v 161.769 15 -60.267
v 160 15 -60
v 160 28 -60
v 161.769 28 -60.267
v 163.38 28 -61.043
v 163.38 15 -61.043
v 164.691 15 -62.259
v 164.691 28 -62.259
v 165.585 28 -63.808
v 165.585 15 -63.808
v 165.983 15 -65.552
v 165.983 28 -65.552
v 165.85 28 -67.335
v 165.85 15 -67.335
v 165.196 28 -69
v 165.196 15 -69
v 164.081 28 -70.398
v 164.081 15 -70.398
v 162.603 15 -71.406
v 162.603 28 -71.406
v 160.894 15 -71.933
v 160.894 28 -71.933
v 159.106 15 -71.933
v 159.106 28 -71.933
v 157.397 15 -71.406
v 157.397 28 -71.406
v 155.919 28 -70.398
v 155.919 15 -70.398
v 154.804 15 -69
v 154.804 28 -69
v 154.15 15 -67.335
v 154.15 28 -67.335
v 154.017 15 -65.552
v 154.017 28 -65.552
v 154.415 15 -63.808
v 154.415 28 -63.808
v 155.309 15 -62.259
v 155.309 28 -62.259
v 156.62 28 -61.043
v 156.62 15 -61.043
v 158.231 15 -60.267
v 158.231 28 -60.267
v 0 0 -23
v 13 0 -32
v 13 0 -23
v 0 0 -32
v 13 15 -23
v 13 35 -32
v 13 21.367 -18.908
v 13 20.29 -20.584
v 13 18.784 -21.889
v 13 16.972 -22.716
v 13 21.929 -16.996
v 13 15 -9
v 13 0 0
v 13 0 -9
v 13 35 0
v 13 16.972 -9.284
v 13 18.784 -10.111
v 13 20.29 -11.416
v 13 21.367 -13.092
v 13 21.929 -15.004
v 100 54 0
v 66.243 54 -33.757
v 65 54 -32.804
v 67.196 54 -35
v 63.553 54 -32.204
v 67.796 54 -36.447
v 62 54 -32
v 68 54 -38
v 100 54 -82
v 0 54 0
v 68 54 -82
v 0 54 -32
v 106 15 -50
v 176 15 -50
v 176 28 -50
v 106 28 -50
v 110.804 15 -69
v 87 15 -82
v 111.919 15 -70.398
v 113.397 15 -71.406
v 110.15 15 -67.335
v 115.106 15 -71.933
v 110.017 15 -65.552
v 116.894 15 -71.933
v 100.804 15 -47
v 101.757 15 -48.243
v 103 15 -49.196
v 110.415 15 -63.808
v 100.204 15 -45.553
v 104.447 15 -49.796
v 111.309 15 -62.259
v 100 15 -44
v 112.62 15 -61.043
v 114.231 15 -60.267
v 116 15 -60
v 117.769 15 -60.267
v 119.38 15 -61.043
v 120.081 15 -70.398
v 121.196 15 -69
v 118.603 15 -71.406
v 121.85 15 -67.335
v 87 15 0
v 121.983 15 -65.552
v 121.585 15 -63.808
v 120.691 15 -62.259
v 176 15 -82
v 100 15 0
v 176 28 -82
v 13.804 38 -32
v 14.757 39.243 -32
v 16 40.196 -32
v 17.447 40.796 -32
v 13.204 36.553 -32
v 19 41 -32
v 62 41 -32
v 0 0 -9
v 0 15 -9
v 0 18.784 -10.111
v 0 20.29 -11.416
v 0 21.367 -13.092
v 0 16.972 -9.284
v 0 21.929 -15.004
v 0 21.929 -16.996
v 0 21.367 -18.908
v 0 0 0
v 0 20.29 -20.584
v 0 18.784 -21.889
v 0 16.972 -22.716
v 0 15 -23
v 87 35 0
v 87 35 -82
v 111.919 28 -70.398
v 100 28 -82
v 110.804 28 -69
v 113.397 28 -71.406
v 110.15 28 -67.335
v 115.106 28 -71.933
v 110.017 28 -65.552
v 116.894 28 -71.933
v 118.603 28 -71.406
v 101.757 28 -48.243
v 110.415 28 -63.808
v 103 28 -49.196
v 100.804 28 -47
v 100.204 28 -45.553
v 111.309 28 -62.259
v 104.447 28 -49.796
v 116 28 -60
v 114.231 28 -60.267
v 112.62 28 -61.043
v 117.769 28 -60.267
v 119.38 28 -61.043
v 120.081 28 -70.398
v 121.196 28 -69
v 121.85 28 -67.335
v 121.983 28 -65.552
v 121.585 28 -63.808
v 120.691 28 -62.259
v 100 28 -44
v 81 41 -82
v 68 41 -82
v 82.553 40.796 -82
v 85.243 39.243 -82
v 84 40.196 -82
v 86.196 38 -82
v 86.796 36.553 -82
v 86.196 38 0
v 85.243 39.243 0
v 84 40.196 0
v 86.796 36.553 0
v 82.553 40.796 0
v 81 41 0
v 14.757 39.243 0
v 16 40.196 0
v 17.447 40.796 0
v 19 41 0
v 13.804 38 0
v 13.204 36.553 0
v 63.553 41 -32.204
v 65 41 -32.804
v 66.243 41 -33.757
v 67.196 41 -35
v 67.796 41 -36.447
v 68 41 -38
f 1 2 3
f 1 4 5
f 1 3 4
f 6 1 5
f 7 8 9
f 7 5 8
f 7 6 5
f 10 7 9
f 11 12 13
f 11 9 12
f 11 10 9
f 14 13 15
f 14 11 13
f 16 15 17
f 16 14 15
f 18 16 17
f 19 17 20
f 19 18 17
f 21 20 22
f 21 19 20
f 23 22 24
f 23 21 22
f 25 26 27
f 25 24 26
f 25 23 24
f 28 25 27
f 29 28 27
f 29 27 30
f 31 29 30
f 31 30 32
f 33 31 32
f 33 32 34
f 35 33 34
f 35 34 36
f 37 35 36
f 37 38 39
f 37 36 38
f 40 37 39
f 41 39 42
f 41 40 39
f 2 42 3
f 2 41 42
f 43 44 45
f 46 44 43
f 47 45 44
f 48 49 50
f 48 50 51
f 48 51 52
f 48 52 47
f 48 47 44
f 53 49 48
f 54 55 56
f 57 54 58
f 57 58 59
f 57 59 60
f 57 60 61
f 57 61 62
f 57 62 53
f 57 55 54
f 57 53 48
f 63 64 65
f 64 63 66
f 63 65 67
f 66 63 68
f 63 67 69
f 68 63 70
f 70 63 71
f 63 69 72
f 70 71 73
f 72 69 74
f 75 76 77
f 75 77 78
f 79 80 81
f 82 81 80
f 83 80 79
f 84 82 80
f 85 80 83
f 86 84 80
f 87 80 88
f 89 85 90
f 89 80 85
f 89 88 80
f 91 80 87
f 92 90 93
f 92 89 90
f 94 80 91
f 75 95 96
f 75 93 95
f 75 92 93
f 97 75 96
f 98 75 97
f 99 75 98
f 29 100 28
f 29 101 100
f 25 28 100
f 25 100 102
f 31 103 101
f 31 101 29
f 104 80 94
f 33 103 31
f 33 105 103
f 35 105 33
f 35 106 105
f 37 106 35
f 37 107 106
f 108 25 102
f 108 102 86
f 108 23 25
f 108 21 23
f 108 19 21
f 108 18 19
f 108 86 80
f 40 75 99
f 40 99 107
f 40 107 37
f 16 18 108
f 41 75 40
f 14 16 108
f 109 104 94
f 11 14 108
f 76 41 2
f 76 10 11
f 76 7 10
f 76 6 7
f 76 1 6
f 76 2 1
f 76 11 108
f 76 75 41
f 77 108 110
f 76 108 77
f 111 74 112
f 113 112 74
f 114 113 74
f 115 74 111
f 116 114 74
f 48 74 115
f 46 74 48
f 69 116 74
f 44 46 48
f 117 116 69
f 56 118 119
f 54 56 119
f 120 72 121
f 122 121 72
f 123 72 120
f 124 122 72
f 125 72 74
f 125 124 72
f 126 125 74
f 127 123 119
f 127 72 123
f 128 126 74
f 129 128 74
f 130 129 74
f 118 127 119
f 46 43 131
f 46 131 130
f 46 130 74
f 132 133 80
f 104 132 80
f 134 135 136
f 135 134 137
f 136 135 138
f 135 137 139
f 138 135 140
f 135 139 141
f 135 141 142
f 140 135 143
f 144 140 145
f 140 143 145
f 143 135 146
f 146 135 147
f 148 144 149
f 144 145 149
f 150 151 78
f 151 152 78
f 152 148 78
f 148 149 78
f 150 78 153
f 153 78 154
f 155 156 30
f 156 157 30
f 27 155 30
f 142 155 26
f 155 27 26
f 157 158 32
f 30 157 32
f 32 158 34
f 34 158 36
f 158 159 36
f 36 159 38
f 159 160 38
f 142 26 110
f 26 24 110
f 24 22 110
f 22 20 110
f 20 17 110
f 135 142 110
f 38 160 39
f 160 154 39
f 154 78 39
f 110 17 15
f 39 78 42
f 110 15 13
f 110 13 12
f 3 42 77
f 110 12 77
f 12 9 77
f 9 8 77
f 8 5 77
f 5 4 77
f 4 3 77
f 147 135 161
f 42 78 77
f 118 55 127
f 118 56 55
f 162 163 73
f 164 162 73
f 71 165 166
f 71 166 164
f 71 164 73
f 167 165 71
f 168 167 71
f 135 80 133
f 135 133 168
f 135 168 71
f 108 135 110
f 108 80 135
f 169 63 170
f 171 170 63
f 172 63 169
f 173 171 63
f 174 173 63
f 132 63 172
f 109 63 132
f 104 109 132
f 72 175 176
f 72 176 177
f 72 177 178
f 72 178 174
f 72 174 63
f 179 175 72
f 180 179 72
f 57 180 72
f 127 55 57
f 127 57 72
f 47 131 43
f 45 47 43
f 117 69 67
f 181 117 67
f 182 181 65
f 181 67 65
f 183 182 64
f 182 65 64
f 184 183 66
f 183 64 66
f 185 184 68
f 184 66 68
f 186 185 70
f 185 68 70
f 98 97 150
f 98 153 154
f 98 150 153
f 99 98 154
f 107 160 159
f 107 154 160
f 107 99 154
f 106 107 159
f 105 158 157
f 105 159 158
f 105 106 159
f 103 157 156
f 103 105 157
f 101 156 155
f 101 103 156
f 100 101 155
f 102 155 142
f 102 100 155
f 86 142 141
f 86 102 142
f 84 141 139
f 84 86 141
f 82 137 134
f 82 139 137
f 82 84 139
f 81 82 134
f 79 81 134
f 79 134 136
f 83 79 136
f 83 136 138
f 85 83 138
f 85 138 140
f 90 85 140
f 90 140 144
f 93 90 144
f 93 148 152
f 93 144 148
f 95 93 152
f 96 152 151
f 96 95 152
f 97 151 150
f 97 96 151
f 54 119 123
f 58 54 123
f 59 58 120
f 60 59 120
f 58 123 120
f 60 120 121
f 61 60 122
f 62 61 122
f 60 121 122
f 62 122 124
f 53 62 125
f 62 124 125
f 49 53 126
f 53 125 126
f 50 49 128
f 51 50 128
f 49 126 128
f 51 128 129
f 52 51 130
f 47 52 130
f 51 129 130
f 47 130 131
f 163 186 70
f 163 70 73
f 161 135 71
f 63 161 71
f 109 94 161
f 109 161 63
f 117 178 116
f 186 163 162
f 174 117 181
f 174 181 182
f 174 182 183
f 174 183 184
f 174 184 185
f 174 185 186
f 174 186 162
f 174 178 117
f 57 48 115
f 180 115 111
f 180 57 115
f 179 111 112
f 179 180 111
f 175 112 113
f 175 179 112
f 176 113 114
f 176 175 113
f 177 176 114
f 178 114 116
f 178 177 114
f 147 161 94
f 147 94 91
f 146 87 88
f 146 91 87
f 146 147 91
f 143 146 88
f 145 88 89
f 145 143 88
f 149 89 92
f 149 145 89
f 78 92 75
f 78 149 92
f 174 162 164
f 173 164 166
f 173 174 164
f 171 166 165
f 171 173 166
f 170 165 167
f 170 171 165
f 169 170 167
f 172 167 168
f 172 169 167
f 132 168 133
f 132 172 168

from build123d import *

# Parameters (mm, degrees)
SKETCH_1_R          = 6
EXTRUDE_1_DEPTH     = 54
FILLET_1_R          = 6
SKETCH_2_W          = 76
SKETCH_2_H          = 26
CUT_EXTRUDE_1_DEPTH = 83
CUT_EXTRUDE_2_REACH = 178


with BuildPart() as part:
    # 스케치1 → 보스-돌출1 (new body)
    with BuildSketch(Plane(origin=(0, 0, 0), x_dir=(1, 0, 0), z_dir=(0, 1, 0))):
        Polygon((0, 32), (68, 32), (68, 82), (176, 82), (176, 50), (100, 50), (100, 0), (0, 0), align=None)
        with Locations(Location((116, 66, 0), (0, 0, 270))):  # turned: the seam where the file's is
            Circle(SKETCH_1_R, mode=Mode.SUBTRACT)
        with Locations(Location((160, 66, 0), (0, 0, 270))):  # turned: the seam where the file's is
            Circle(SKETCH_1_R, mode=Mode.SUBTRACT)
    extrude(amount=EXTRUDE_1_DEPTH)

    # 필렛1
    fillet_1_edges = [part.edges().sort_by_distance(p)[0] for p in [
        (68, 27, -32),
        (100, 27, -50),
    ]]
    fillet(fillet_1_edges, radius=FILLET_1_R)

    # 스케치2 → 컷-돌출1 (cut, through all)
    with BuildSketch(Plane.XY):
        with BuildLine():
            Line((87, 35), (87, 15))
            Line((87, 15), (176, 15))
            Line((176, 15), (176, 0))
            Line((176, 0), (13, 0))
            Line((13, 0), (13, 35))
            ThreePointArc((13, 35), (14.757359313, 39.242640687), (19, 41))
            Line((19, 41), (81, 41))
            ThreePointArc((81, 41), (85.242640687, 39.242640687), (87, 35))
        make_face()
        with Locations((138, 41)):
            Rectangle(SKETCH_2_W, SKETCH_2_H)
    extrude(amount=-CUT_EXTRUDE_1_DEPTH, mode=Mode.SUBTRACT)

    # 스케치3 → 컷-돌출2 (cut, up to next)
    with BuildSketch(Plane(origin=(0, 0, 0), x_dir=(0, 0, -1), z_dir=(1, 0, 0)), mode=Mode.PRIVATE) as cut_extrude_2_sk1:
        with BuildLine():
            Line((23, 15), (23, 0))
            Line((23, 0), (9, 0))
            Line((9, 0), (9, 15))
            ThreePointArc((9, 15), (16, 22), (23, 15))
        make_face()
    cut_extrude_2_tool1 = extrude(cut_extrude_2_sk1.sketch, amount=CUT_EXTRUDE_2_REACH, mode=Mode.PRIVATE) & part.part
    add(cut_extrude_2_tool1.solids().sort_by_distance((0, 10.308437, -16))[0], mode=Mode.SUBTRACT)


solid = part.part
